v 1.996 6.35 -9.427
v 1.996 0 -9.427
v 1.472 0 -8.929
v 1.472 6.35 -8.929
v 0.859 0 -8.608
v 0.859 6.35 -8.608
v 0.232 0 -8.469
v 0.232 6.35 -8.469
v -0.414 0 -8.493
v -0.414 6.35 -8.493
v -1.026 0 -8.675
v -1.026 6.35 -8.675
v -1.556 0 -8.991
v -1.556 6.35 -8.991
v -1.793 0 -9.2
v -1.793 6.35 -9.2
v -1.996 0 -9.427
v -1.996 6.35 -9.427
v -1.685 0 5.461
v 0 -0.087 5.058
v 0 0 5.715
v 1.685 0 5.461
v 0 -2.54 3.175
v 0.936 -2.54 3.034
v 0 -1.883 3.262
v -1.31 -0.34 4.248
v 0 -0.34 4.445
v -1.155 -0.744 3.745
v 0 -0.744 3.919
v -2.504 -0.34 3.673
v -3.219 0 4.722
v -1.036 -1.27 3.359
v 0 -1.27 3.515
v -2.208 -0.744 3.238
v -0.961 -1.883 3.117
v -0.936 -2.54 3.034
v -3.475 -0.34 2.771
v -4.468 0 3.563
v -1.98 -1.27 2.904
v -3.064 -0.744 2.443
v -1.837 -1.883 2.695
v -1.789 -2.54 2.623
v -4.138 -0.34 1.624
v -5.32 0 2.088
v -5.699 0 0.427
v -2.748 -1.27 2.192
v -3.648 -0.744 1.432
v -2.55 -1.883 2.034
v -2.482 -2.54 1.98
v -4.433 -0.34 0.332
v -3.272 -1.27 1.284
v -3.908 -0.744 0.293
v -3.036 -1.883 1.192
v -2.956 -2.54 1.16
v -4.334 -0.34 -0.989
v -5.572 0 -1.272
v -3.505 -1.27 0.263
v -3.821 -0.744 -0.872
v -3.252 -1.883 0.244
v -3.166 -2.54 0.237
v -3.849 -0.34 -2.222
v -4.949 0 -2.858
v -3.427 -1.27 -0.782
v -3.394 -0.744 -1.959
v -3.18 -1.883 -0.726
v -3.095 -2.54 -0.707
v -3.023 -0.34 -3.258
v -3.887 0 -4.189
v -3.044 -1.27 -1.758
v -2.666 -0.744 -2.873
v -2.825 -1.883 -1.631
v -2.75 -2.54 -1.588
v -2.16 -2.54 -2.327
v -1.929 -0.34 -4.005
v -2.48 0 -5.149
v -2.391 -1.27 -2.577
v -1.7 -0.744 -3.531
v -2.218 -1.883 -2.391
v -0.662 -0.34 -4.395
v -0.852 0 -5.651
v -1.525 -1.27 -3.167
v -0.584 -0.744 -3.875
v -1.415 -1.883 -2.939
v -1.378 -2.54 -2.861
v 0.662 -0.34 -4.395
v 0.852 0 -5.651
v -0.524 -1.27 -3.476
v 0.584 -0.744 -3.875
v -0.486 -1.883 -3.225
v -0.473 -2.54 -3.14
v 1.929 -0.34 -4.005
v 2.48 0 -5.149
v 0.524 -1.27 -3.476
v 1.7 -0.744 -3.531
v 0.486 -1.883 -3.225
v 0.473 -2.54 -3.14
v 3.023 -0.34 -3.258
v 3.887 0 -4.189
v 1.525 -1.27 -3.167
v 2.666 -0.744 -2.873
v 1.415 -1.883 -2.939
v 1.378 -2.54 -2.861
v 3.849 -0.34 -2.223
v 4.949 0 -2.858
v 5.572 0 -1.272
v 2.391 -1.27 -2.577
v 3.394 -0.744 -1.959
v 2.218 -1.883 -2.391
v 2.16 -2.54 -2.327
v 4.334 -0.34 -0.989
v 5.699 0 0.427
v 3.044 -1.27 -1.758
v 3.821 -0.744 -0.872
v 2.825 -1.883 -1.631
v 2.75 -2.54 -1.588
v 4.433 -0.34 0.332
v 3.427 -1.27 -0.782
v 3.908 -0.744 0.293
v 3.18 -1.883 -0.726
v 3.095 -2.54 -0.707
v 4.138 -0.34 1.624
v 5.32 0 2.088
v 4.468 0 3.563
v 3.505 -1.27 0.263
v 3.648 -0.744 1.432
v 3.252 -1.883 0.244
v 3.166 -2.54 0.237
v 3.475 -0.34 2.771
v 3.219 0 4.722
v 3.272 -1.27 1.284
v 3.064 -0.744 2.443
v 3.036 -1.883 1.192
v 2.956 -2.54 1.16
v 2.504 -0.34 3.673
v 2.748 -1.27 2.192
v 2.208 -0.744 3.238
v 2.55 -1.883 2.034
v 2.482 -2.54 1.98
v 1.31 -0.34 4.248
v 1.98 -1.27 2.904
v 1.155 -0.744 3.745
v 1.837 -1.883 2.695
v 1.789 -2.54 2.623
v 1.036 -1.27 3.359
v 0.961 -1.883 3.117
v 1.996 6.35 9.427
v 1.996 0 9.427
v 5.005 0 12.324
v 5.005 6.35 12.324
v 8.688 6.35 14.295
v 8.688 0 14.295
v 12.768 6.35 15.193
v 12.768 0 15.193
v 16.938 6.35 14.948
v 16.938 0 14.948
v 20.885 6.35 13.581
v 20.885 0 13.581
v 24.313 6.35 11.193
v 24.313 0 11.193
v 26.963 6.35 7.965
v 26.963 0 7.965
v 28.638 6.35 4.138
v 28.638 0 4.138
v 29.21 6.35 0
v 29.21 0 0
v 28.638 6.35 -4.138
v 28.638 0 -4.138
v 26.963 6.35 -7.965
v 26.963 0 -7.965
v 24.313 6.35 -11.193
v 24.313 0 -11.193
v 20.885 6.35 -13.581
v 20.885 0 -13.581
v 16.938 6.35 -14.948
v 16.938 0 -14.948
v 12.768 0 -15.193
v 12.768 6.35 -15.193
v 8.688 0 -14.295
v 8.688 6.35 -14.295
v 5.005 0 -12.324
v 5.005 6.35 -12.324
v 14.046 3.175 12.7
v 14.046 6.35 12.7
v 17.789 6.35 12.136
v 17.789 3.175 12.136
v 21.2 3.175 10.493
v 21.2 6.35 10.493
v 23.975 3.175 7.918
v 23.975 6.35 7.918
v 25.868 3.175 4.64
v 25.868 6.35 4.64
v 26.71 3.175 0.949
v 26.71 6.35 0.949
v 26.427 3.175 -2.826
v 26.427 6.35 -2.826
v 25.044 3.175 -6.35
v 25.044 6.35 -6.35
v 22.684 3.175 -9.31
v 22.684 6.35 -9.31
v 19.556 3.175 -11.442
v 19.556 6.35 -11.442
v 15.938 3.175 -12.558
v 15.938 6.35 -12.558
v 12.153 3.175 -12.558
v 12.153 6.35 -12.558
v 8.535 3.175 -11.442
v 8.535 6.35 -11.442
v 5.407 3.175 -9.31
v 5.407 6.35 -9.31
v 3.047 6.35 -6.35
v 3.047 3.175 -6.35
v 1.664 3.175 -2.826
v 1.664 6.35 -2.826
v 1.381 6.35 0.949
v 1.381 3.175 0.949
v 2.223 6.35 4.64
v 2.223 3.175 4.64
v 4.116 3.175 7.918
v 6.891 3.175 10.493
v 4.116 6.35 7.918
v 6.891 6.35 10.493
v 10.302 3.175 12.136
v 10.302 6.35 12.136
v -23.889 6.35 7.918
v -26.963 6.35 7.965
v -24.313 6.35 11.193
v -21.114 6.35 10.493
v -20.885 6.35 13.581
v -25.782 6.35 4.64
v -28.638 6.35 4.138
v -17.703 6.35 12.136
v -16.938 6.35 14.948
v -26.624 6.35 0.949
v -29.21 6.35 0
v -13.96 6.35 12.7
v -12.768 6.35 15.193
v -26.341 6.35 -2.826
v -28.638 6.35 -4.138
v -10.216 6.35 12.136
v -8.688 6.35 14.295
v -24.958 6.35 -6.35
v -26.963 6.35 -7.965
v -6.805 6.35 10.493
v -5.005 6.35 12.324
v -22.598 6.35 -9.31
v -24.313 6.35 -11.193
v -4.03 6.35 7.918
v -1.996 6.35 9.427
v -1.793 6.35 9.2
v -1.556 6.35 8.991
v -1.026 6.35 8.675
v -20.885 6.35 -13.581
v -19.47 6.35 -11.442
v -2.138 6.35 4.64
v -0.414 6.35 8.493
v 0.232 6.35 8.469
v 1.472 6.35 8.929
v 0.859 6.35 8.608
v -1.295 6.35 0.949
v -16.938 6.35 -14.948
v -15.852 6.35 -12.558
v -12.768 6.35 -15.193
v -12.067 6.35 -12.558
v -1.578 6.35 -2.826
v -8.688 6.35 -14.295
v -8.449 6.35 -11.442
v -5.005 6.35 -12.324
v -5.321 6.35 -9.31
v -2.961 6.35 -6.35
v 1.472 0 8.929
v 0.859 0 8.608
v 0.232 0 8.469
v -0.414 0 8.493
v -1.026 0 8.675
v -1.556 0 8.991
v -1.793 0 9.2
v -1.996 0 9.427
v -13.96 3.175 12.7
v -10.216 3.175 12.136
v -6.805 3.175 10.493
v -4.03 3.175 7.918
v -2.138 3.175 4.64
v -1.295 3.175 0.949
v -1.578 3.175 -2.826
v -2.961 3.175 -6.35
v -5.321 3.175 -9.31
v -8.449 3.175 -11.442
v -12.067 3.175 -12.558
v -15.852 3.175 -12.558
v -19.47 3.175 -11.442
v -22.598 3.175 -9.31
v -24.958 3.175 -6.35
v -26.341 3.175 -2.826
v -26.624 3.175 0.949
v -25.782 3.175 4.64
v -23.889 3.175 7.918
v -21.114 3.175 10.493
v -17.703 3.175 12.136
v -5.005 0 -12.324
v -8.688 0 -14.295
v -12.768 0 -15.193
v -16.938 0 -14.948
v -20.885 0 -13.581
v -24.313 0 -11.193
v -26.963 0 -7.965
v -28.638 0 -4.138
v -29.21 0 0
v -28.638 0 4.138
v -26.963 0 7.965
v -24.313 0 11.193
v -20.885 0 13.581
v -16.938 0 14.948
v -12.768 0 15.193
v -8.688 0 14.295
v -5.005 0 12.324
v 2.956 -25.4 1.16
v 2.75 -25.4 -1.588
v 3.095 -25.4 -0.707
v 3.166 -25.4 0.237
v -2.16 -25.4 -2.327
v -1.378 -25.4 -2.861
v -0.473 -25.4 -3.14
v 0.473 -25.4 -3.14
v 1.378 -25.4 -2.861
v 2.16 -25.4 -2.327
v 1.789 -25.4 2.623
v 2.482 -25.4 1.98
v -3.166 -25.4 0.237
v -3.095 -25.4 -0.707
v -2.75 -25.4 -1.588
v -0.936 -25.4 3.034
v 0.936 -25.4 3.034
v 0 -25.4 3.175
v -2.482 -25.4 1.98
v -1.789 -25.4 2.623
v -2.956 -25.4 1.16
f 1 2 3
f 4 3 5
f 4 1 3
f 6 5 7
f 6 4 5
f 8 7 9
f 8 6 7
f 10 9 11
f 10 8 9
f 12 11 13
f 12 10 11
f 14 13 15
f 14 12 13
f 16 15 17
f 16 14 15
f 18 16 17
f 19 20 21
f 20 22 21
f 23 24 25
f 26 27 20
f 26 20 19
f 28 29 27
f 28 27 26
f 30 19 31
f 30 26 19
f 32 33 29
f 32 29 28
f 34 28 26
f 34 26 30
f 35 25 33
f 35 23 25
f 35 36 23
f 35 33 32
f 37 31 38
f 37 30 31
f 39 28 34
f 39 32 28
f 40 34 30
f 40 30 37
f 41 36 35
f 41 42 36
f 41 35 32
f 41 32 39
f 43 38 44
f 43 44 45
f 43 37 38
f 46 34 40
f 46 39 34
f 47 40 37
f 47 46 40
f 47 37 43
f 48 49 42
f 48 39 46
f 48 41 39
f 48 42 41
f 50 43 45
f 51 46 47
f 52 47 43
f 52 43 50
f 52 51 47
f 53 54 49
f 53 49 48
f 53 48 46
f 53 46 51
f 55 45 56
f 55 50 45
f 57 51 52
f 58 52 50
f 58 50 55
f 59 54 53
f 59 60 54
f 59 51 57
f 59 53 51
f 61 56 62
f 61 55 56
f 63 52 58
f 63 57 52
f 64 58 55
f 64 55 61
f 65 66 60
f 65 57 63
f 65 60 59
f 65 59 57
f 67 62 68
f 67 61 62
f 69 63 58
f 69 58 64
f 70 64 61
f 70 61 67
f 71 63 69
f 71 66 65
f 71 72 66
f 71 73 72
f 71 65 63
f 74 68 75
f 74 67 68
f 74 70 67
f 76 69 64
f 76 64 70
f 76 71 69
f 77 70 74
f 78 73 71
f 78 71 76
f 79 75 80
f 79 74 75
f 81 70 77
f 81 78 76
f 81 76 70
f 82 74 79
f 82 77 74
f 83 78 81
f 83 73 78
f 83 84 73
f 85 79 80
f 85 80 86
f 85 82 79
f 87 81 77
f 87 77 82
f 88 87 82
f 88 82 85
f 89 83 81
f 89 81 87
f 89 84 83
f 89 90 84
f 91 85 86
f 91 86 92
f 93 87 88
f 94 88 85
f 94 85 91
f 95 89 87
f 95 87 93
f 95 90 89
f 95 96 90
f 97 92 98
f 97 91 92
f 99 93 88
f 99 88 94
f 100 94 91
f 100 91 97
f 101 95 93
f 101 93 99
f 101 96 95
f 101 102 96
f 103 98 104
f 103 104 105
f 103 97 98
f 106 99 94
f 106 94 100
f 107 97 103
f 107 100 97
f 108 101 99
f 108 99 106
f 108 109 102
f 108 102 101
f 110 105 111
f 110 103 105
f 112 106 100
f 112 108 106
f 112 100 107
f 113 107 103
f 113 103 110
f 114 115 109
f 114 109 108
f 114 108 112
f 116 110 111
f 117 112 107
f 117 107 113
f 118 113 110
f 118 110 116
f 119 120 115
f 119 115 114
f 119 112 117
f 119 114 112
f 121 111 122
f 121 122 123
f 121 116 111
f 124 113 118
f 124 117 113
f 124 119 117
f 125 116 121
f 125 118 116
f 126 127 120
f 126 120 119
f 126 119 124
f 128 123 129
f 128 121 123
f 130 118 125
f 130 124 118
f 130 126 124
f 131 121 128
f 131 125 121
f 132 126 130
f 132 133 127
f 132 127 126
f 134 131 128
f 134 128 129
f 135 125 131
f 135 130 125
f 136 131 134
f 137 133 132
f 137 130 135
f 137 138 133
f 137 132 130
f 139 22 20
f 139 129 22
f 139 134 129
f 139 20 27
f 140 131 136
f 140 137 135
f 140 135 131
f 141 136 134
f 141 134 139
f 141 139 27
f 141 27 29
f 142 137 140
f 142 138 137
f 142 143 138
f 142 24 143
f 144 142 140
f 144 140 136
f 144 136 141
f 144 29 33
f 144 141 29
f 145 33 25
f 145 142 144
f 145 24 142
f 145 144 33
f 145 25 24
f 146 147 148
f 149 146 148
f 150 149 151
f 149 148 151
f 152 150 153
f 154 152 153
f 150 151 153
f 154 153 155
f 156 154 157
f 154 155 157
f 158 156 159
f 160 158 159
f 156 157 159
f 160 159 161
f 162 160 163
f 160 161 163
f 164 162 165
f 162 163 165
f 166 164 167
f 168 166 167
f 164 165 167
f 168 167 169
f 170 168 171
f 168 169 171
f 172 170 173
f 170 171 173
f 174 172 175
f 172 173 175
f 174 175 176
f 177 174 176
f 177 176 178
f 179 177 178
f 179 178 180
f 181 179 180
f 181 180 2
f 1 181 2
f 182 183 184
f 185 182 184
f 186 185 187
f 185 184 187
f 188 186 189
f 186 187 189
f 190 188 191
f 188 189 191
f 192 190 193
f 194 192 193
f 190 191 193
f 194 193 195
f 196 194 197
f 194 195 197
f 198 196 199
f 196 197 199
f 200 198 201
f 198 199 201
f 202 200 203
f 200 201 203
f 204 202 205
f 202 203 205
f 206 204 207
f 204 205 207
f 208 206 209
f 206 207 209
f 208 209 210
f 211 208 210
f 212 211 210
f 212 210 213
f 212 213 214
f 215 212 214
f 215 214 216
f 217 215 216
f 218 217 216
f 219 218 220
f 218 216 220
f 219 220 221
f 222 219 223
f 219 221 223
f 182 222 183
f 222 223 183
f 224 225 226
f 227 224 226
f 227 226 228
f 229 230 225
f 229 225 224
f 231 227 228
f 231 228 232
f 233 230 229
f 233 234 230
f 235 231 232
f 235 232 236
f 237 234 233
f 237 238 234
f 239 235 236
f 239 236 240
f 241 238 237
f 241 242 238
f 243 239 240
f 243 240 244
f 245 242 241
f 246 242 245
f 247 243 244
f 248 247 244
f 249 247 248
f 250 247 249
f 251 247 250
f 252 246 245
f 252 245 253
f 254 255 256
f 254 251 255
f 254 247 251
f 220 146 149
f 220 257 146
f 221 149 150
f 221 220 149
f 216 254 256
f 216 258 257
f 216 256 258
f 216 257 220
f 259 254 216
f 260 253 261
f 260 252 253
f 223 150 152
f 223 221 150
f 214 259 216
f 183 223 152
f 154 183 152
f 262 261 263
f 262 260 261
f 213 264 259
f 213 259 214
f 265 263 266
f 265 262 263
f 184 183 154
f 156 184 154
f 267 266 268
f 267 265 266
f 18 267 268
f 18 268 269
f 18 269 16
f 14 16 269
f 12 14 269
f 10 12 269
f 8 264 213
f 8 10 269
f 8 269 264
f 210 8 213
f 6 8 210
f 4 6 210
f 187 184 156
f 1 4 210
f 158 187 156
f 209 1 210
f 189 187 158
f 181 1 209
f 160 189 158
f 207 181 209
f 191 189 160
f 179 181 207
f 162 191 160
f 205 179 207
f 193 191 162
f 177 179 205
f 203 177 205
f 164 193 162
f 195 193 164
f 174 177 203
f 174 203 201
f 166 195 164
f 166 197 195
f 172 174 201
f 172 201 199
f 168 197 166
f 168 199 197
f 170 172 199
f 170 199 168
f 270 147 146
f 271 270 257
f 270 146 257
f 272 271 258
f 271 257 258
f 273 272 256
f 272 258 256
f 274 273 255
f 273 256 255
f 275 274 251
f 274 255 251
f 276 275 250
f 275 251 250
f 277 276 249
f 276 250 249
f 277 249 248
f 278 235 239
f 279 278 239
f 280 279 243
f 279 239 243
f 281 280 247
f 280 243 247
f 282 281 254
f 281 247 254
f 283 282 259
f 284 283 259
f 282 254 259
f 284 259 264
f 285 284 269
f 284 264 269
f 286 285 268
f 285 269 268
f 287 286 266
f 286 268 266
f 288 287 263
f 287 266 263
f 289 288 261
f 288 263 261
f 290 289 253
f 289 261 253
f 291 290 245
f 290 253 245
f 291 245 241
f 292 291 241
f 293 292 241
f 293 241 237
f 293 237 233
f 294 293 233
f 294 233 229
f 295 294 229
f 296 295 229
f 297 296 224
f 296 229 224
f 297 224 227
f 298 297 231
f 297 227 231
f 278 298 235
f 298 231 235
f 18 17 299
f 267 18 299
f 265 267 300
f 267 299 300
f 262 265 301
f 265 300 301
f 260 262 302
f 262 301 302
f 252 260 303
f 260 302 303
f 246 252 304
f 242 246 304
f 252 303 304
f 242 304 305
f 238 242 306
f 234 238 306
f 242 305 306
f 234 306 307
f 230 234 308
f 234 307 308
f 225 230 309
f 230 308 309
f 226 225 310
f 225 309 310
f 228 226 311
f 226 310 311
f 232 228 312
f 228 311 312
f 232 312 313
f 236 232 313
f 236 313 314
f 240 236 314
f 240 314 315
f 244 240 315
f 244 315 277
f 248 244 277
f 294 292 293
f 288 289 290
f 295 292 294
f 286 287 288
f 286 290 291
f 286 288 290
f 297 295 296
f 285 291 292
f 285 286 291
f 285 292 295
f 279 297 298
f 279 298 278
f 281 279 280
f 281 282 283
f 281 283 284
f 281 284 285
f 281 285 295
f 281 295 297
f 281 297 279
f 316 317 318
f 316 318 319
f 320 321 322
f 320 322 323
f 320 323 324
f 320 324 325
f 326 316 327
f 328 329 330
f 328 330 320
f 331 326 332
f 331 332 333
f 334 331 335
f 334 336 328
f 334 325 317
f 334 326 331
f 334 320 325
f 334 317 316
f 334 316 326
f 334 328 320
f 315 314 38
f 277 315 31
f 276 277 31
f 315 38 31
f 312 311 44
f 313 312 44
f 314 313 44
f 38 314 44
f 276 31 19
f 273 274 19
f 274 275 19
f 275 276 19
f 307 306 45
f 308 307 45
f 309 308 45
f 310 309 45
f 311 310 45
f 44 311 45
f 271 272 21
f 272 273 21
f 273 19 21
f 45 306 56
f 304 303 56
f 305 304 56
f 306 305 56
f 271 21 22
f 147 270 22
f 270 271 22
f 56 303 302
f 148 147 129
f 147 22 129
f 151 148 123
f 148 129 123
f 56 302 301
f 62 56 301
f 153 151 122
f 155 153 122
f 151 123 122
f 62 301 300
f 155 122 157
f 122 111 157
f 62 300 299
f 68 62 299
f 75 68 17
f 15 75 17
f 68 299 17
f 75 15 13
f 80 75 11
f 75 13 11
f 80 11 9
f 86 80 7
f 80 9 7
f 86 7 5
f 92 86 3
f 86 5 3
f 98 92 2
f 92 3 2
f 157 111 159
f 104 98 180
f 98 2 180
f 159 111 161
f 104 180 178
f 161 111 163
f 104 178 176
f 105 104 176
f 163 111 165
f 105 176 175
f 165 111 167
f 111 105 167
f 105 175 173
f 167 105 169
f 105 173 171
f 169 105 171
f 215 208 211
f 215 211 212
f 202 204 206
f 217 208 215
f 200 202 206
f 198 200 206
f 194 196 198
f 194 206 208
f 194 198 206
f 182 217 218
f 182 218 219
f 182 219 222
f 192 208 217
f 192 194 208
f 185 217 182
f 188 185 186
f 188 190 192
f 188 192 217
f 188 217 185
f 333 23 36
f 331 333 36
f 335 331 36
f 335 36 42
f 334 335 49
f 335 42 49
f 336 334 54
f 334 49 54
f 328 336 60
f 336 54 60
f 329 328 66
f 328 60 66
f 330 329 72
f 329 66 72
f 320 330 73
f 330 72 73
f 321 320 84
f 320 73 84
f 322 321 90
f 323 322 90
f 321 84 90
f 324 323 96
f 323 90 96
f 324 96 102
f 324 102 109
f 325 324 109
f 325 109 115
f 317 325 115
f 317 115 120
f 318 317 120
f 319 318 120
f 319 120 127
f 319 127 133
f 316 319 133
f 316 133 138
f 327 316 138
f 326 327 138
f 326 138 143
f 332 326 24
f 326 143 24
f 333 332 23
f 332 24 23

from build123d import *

# Parameters (mm, degrees)
BOSS_EXTRUDE1_DEPTH = 6.35
SKETCH3_R           = 12.7
CUT_EXTRUDE1_DEPTH  = 3.175
SKETCH5_R           = 12.7
CUT_EXTRUDE2_DEPTH  = 3.175
SKETCH6_R           = 3.175
BOSS_EXTRUDE2_DEPTH = 25.4
FILLET1_R           = 2.54


with BuildPart() as part:
    # Sketch2 → Boss-Extrude1 (new body)
    with BuildSketch(Plane(origin=(0, 0, 0), x_dir=(1, 0, 0), z_dir=(0, 1, 0))):
        with BuildLine():
            ThreePointArc((0, -6.090706035), (29.21, 0), (0, 6.090706035))
            ThreePointArc((0, 6.090706035), (-29.21, 0), (0, -6.090706035))
        make_face()
    extrude(amount=BOSS_EXTRUDE1_DEPTH)

    # Sketch3 → Cut-Extrude1 (cut)
    with BuildSketch(Plane(origin=(0, 6.35, 0), x_dir=(1, 0, 0), z_dir=(0, 1, 0))):
        with Locations(Location((-13.959659088, 0, 0), (0, 0, 270))):
            Circle(SKETCH3_R)
    extrude(amount=-CUT_EXTRUDE1_DEPTH, mode=Mode.SUBTRACT)

    # Sketch5 → Cut-Extrude2 (cut)
    with BuildSketch(Plane(origin=(0, 6.35, 0), x_dir=(1, 0, 0), z_dir=(0, 1, 0))):
        with Locations(Location((14.045562682, 0, 0), (0, 0, 270))):
            Circle(SKETCH5_R)
    extrude(amount=-CUT_EXTRUDE2_DEPTH, mode=Mode.SUBTRACT)

    # Sketch6 → Boss-Extrude2 (add)
    with BuildSketch(Plane(origin=(0, 0, 0), x_dir=(-1, 0, 0), z_dir=(0, -1, 0))):
        with Locations(Location((0, 0, 0), (0, 0, 270))):
            Circle(SKETCH6_R)
    extrude(amount=BOSS_EXTRUDE2_DEPTH)

    # Fillet1
    fillet1_edges = [part.edges().sort_by_distance(p)[0] for p in [
        (0, 0, -3.175),
        (0, 3.175, -6.090706035),
        (0, 3.175, 6.090706035),
    ]]
    fillet(fillet1_edges, radius=FILLET1_R)


solid = part.part
